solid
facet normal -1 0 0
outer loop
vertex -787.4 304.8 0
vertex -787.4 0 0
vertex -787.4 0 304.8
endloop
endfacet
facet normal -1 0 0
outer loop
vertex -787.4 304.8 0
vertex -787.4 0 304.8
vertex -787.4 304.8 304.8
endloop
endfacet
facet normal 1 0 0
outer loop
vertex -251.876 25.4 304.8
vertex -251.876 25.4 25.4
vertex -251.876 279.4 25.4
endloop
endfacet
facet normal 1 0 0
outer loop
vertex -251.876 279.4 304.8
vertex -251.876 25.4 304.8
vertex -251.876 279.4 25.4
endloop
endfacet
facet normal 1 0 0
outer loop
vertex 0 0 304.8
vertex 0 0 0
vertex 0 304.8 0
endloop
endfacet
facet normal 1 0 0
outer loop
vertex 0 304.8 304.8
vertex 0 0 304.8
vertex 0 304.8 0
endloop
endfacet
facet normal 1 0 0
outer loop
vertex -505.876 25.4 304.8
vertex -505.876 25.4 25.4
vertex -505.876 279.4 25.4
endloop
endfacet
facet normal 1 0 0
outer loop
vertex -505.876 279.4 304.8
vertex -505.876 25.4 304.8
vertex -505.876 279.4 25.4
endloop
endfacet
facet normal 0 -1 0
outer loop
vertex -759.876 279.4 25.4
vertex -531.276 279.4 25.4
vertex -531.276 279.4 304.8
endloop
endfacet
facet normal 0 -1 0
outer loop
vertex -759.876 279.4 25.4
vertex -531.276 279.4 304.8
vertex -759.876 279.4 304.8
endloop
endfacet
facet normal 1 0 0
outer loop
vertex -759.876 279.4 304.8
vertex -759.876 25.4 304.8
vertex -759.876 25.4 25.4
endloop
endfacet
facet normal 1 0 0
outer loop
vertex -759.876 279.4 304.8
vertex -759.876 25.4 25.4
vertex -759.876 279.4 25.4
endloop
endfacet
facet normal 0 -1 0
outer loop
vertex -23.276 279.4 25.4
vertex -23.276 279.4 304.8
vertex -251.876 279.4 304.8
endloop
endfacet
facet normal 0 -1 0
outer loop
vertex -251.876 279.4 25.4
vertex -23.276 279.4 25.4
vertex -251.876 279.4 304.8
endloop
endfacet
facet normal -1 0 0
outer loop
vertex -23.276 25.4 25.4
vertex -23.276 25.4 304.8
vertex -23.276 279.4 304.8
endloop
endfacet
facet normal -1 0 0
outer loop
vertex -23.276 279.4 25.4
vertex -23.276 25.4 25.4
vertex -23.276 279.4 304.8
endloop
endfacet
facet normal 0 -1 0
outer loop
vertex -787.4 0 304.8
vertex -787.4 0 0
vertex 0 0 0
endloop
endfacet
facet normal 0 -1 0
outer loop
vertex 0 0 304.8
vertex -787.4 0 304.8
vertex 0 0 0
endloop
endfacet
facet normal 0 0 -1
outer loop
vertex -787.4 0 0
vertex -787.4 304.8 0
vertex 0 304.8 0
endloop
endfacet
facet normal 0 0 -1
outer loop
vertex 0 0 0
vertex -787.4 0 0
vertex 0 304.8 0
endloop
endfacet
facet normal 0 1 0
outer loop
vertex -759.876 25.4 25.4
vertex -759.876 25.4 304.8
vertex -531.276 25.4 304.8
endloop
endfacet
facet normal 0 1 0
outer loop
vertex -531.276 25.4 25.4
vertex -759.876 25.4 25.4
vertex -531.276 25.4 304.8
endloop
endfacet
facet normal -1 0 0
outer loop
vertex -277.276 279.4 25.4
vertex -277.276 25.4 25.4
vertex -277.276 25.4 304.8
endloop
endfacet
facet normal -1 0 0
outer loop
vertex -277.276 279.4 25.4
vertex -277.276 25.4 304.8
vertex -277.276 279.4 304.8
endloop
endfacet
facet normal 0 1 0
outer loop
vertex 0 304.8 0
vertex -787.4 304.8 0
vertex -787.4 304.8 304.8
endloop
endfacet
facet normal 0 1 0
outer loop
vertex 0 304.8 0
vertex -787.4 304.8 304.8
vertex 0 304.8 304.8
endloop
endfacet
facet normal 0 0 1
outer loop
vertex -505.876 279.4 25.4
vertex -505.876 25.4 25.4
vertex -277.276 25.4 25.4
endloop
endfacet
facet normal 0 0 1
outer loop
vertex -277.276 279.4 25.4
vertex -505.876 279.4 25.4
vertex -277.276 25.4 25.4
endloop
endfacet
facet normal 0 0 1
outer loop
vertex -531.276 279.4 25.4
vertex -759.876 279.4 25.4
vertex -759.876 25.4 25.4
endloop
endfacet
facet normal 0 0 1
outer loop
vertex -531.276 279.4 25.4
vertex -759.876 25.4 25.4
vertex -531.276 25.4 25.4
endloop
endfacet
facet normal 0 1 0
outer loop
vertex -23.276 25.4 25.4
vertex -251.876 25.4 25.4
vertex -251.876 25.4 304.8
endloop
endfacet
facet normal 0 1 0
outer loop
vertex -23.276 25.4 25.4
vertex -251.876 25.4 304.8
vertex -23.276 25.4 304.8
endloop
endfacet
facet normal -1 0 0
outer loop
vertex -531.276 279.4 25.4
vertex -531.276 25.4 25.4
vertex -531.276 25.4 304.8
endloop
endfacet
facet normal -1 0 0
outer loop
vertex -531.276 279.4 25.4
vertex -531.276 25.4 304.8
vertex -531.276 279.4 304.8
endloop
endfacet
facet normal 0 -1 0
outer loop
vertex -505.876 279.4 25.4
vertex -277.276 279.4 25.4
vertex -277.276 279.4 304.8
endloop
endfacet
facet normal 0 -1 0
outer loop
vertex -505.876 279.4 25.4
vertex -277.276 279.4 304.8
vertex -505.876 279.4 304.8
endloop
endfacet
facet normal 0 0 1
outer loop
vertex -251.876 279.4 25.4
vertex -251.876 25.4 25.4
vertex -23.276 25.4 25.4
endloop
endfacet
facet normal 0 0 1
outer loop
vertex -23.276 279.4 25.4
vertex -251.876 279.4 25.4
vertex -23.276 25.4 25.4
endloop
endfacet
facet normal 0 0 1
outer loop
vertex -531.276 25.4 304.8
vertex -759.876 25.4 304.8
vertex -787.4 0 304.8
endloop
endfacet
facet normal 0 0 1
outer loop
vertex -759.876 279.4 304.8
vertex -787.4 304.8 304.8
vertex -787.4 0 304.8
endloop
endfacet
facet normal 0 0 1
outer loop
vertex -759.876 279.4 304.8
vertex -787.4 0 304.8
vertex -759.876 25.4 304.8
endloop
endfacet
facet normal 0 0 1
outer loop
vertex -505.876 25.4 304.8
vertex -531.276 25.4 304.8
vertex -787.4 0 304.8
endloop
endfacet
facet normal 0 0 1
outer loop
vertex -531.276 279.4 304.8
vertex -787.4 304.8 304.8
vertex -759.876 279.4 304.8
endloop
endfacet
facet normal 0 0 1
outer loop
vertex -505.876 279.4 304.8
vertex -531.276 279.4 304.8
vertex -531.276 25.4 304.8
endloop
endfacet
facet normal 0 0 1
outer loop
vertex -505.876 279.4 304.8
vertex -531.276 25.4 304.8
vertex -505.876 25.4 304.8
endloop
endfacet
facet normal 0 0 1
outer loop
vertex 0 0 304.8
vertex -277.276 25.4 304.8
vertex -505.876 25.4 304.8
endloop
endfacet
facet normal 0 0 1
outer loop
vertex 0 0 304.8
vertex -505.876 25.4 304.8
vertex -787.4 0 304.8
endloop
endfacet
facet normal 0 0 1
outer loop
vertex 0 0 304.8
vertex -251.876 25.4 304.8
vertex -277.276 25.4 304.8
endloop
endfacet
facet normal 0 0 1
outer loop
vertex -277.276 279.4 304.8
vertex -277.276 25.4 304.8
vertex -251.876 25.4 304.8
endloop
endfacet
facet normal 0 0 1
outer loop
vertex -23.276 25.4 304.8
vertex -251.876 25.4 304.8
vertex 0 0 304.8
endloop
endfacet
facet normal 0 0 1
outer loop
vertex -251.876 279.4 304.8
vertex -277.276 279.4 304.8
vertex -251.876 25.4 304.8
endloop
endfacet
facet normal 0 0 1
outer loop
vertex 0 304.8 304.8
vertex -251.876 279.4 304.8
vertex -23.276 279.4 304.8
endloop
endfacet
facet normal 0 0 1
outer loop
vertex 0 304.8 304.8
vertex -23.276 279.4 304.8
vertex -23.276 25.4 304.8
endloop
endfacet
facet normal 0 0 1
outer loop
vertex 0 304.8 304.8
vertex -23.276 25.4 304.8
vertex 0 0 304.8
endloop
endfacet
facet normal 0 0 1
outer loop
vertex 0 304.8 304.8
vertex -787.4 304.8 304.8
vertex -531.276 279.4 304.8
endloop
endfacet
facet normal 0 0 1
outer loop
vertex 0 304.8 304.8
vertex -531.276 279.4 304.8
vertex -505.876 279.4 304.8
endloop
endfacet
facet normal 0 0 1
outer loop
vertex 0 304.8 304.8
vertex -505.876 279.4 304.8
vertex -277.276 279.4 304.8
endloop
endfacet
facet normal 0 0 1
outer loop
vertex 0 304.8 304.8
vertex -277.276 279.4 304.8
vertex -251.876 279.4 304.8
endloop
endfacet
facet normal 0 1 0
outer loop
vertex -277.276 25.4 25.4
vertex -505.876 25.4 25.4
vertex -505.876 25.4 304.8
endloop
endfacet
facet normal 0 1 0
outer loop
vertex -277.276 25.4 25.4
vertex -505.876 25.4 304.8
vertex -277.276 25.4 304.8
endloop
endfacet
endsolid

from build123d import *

# Parameters (mm, degrees)
F0_W     = 787.4
F0_H     = 304.8
F1_DEPTH = 304.8
F2_W     = 228.6
F2_H     = 254
F2_W_2   = 508
F4_DEPTH = 279.4
F3_W     = 508
F3_H     = 254
F5_DEPTH = 279.4
F6_W     = 25.4
F6_H     = 254
F7_DEPTH = 279.4
F8_W     = 25.4
F8_H     = 254
F9_DEPTH = 279.4


with BuildPart() as f1:
    # F0 (on Top) → F1 (new body)
    with BuildSketch(Plane.XY):
        with Locations((-393.7, 152.4)):
            Rectangle(F0_W, F0_H)
    extrude(amount=F1_DEPTH)

    # F2 (on face) → F4 (cut)
    with BuildSketch(Plane.XY.offset(304.8)):
        with Locations((-645.575834, 152.4)):
            Rectangle(F2_W, F2_H)
        with Locations((-277.275834, 152.4)):
            Rectangle(F2_W_2, F2_H)
    extrude(amount=-F4_DEPTH, mode=Mode.SUBTRACT)

    # F3 (on face) → F5 (cut)
    with BuildSketch(Plane.XY.offset(304.8)):
        with Locations((-277.275834, 152.4)):
            Rectangle(F3_W, F3_H)
    extrude(amount=-F5_DEPTH, mode=Mode.SUBTRACT)

    # F6 (on face) → F7 (join, through all)
    with BuildSketch(Plane.XY.offset(25.4)):
        with Locations((-518.575834, 152.4)):
            Rectangle(F6_W, F6_H)
    extrude(amount=F7_DEPTH)

    # F8 (on face) → F9 (join, through all)
    with BuildSketch(Plane.XY.offset(25.4)):
        with Locations((-264.575834, 152.4)):
            Rectangle(F8_W, F8_H)
    extrude(amount=F9_DEPTH)


solid = f1.part
